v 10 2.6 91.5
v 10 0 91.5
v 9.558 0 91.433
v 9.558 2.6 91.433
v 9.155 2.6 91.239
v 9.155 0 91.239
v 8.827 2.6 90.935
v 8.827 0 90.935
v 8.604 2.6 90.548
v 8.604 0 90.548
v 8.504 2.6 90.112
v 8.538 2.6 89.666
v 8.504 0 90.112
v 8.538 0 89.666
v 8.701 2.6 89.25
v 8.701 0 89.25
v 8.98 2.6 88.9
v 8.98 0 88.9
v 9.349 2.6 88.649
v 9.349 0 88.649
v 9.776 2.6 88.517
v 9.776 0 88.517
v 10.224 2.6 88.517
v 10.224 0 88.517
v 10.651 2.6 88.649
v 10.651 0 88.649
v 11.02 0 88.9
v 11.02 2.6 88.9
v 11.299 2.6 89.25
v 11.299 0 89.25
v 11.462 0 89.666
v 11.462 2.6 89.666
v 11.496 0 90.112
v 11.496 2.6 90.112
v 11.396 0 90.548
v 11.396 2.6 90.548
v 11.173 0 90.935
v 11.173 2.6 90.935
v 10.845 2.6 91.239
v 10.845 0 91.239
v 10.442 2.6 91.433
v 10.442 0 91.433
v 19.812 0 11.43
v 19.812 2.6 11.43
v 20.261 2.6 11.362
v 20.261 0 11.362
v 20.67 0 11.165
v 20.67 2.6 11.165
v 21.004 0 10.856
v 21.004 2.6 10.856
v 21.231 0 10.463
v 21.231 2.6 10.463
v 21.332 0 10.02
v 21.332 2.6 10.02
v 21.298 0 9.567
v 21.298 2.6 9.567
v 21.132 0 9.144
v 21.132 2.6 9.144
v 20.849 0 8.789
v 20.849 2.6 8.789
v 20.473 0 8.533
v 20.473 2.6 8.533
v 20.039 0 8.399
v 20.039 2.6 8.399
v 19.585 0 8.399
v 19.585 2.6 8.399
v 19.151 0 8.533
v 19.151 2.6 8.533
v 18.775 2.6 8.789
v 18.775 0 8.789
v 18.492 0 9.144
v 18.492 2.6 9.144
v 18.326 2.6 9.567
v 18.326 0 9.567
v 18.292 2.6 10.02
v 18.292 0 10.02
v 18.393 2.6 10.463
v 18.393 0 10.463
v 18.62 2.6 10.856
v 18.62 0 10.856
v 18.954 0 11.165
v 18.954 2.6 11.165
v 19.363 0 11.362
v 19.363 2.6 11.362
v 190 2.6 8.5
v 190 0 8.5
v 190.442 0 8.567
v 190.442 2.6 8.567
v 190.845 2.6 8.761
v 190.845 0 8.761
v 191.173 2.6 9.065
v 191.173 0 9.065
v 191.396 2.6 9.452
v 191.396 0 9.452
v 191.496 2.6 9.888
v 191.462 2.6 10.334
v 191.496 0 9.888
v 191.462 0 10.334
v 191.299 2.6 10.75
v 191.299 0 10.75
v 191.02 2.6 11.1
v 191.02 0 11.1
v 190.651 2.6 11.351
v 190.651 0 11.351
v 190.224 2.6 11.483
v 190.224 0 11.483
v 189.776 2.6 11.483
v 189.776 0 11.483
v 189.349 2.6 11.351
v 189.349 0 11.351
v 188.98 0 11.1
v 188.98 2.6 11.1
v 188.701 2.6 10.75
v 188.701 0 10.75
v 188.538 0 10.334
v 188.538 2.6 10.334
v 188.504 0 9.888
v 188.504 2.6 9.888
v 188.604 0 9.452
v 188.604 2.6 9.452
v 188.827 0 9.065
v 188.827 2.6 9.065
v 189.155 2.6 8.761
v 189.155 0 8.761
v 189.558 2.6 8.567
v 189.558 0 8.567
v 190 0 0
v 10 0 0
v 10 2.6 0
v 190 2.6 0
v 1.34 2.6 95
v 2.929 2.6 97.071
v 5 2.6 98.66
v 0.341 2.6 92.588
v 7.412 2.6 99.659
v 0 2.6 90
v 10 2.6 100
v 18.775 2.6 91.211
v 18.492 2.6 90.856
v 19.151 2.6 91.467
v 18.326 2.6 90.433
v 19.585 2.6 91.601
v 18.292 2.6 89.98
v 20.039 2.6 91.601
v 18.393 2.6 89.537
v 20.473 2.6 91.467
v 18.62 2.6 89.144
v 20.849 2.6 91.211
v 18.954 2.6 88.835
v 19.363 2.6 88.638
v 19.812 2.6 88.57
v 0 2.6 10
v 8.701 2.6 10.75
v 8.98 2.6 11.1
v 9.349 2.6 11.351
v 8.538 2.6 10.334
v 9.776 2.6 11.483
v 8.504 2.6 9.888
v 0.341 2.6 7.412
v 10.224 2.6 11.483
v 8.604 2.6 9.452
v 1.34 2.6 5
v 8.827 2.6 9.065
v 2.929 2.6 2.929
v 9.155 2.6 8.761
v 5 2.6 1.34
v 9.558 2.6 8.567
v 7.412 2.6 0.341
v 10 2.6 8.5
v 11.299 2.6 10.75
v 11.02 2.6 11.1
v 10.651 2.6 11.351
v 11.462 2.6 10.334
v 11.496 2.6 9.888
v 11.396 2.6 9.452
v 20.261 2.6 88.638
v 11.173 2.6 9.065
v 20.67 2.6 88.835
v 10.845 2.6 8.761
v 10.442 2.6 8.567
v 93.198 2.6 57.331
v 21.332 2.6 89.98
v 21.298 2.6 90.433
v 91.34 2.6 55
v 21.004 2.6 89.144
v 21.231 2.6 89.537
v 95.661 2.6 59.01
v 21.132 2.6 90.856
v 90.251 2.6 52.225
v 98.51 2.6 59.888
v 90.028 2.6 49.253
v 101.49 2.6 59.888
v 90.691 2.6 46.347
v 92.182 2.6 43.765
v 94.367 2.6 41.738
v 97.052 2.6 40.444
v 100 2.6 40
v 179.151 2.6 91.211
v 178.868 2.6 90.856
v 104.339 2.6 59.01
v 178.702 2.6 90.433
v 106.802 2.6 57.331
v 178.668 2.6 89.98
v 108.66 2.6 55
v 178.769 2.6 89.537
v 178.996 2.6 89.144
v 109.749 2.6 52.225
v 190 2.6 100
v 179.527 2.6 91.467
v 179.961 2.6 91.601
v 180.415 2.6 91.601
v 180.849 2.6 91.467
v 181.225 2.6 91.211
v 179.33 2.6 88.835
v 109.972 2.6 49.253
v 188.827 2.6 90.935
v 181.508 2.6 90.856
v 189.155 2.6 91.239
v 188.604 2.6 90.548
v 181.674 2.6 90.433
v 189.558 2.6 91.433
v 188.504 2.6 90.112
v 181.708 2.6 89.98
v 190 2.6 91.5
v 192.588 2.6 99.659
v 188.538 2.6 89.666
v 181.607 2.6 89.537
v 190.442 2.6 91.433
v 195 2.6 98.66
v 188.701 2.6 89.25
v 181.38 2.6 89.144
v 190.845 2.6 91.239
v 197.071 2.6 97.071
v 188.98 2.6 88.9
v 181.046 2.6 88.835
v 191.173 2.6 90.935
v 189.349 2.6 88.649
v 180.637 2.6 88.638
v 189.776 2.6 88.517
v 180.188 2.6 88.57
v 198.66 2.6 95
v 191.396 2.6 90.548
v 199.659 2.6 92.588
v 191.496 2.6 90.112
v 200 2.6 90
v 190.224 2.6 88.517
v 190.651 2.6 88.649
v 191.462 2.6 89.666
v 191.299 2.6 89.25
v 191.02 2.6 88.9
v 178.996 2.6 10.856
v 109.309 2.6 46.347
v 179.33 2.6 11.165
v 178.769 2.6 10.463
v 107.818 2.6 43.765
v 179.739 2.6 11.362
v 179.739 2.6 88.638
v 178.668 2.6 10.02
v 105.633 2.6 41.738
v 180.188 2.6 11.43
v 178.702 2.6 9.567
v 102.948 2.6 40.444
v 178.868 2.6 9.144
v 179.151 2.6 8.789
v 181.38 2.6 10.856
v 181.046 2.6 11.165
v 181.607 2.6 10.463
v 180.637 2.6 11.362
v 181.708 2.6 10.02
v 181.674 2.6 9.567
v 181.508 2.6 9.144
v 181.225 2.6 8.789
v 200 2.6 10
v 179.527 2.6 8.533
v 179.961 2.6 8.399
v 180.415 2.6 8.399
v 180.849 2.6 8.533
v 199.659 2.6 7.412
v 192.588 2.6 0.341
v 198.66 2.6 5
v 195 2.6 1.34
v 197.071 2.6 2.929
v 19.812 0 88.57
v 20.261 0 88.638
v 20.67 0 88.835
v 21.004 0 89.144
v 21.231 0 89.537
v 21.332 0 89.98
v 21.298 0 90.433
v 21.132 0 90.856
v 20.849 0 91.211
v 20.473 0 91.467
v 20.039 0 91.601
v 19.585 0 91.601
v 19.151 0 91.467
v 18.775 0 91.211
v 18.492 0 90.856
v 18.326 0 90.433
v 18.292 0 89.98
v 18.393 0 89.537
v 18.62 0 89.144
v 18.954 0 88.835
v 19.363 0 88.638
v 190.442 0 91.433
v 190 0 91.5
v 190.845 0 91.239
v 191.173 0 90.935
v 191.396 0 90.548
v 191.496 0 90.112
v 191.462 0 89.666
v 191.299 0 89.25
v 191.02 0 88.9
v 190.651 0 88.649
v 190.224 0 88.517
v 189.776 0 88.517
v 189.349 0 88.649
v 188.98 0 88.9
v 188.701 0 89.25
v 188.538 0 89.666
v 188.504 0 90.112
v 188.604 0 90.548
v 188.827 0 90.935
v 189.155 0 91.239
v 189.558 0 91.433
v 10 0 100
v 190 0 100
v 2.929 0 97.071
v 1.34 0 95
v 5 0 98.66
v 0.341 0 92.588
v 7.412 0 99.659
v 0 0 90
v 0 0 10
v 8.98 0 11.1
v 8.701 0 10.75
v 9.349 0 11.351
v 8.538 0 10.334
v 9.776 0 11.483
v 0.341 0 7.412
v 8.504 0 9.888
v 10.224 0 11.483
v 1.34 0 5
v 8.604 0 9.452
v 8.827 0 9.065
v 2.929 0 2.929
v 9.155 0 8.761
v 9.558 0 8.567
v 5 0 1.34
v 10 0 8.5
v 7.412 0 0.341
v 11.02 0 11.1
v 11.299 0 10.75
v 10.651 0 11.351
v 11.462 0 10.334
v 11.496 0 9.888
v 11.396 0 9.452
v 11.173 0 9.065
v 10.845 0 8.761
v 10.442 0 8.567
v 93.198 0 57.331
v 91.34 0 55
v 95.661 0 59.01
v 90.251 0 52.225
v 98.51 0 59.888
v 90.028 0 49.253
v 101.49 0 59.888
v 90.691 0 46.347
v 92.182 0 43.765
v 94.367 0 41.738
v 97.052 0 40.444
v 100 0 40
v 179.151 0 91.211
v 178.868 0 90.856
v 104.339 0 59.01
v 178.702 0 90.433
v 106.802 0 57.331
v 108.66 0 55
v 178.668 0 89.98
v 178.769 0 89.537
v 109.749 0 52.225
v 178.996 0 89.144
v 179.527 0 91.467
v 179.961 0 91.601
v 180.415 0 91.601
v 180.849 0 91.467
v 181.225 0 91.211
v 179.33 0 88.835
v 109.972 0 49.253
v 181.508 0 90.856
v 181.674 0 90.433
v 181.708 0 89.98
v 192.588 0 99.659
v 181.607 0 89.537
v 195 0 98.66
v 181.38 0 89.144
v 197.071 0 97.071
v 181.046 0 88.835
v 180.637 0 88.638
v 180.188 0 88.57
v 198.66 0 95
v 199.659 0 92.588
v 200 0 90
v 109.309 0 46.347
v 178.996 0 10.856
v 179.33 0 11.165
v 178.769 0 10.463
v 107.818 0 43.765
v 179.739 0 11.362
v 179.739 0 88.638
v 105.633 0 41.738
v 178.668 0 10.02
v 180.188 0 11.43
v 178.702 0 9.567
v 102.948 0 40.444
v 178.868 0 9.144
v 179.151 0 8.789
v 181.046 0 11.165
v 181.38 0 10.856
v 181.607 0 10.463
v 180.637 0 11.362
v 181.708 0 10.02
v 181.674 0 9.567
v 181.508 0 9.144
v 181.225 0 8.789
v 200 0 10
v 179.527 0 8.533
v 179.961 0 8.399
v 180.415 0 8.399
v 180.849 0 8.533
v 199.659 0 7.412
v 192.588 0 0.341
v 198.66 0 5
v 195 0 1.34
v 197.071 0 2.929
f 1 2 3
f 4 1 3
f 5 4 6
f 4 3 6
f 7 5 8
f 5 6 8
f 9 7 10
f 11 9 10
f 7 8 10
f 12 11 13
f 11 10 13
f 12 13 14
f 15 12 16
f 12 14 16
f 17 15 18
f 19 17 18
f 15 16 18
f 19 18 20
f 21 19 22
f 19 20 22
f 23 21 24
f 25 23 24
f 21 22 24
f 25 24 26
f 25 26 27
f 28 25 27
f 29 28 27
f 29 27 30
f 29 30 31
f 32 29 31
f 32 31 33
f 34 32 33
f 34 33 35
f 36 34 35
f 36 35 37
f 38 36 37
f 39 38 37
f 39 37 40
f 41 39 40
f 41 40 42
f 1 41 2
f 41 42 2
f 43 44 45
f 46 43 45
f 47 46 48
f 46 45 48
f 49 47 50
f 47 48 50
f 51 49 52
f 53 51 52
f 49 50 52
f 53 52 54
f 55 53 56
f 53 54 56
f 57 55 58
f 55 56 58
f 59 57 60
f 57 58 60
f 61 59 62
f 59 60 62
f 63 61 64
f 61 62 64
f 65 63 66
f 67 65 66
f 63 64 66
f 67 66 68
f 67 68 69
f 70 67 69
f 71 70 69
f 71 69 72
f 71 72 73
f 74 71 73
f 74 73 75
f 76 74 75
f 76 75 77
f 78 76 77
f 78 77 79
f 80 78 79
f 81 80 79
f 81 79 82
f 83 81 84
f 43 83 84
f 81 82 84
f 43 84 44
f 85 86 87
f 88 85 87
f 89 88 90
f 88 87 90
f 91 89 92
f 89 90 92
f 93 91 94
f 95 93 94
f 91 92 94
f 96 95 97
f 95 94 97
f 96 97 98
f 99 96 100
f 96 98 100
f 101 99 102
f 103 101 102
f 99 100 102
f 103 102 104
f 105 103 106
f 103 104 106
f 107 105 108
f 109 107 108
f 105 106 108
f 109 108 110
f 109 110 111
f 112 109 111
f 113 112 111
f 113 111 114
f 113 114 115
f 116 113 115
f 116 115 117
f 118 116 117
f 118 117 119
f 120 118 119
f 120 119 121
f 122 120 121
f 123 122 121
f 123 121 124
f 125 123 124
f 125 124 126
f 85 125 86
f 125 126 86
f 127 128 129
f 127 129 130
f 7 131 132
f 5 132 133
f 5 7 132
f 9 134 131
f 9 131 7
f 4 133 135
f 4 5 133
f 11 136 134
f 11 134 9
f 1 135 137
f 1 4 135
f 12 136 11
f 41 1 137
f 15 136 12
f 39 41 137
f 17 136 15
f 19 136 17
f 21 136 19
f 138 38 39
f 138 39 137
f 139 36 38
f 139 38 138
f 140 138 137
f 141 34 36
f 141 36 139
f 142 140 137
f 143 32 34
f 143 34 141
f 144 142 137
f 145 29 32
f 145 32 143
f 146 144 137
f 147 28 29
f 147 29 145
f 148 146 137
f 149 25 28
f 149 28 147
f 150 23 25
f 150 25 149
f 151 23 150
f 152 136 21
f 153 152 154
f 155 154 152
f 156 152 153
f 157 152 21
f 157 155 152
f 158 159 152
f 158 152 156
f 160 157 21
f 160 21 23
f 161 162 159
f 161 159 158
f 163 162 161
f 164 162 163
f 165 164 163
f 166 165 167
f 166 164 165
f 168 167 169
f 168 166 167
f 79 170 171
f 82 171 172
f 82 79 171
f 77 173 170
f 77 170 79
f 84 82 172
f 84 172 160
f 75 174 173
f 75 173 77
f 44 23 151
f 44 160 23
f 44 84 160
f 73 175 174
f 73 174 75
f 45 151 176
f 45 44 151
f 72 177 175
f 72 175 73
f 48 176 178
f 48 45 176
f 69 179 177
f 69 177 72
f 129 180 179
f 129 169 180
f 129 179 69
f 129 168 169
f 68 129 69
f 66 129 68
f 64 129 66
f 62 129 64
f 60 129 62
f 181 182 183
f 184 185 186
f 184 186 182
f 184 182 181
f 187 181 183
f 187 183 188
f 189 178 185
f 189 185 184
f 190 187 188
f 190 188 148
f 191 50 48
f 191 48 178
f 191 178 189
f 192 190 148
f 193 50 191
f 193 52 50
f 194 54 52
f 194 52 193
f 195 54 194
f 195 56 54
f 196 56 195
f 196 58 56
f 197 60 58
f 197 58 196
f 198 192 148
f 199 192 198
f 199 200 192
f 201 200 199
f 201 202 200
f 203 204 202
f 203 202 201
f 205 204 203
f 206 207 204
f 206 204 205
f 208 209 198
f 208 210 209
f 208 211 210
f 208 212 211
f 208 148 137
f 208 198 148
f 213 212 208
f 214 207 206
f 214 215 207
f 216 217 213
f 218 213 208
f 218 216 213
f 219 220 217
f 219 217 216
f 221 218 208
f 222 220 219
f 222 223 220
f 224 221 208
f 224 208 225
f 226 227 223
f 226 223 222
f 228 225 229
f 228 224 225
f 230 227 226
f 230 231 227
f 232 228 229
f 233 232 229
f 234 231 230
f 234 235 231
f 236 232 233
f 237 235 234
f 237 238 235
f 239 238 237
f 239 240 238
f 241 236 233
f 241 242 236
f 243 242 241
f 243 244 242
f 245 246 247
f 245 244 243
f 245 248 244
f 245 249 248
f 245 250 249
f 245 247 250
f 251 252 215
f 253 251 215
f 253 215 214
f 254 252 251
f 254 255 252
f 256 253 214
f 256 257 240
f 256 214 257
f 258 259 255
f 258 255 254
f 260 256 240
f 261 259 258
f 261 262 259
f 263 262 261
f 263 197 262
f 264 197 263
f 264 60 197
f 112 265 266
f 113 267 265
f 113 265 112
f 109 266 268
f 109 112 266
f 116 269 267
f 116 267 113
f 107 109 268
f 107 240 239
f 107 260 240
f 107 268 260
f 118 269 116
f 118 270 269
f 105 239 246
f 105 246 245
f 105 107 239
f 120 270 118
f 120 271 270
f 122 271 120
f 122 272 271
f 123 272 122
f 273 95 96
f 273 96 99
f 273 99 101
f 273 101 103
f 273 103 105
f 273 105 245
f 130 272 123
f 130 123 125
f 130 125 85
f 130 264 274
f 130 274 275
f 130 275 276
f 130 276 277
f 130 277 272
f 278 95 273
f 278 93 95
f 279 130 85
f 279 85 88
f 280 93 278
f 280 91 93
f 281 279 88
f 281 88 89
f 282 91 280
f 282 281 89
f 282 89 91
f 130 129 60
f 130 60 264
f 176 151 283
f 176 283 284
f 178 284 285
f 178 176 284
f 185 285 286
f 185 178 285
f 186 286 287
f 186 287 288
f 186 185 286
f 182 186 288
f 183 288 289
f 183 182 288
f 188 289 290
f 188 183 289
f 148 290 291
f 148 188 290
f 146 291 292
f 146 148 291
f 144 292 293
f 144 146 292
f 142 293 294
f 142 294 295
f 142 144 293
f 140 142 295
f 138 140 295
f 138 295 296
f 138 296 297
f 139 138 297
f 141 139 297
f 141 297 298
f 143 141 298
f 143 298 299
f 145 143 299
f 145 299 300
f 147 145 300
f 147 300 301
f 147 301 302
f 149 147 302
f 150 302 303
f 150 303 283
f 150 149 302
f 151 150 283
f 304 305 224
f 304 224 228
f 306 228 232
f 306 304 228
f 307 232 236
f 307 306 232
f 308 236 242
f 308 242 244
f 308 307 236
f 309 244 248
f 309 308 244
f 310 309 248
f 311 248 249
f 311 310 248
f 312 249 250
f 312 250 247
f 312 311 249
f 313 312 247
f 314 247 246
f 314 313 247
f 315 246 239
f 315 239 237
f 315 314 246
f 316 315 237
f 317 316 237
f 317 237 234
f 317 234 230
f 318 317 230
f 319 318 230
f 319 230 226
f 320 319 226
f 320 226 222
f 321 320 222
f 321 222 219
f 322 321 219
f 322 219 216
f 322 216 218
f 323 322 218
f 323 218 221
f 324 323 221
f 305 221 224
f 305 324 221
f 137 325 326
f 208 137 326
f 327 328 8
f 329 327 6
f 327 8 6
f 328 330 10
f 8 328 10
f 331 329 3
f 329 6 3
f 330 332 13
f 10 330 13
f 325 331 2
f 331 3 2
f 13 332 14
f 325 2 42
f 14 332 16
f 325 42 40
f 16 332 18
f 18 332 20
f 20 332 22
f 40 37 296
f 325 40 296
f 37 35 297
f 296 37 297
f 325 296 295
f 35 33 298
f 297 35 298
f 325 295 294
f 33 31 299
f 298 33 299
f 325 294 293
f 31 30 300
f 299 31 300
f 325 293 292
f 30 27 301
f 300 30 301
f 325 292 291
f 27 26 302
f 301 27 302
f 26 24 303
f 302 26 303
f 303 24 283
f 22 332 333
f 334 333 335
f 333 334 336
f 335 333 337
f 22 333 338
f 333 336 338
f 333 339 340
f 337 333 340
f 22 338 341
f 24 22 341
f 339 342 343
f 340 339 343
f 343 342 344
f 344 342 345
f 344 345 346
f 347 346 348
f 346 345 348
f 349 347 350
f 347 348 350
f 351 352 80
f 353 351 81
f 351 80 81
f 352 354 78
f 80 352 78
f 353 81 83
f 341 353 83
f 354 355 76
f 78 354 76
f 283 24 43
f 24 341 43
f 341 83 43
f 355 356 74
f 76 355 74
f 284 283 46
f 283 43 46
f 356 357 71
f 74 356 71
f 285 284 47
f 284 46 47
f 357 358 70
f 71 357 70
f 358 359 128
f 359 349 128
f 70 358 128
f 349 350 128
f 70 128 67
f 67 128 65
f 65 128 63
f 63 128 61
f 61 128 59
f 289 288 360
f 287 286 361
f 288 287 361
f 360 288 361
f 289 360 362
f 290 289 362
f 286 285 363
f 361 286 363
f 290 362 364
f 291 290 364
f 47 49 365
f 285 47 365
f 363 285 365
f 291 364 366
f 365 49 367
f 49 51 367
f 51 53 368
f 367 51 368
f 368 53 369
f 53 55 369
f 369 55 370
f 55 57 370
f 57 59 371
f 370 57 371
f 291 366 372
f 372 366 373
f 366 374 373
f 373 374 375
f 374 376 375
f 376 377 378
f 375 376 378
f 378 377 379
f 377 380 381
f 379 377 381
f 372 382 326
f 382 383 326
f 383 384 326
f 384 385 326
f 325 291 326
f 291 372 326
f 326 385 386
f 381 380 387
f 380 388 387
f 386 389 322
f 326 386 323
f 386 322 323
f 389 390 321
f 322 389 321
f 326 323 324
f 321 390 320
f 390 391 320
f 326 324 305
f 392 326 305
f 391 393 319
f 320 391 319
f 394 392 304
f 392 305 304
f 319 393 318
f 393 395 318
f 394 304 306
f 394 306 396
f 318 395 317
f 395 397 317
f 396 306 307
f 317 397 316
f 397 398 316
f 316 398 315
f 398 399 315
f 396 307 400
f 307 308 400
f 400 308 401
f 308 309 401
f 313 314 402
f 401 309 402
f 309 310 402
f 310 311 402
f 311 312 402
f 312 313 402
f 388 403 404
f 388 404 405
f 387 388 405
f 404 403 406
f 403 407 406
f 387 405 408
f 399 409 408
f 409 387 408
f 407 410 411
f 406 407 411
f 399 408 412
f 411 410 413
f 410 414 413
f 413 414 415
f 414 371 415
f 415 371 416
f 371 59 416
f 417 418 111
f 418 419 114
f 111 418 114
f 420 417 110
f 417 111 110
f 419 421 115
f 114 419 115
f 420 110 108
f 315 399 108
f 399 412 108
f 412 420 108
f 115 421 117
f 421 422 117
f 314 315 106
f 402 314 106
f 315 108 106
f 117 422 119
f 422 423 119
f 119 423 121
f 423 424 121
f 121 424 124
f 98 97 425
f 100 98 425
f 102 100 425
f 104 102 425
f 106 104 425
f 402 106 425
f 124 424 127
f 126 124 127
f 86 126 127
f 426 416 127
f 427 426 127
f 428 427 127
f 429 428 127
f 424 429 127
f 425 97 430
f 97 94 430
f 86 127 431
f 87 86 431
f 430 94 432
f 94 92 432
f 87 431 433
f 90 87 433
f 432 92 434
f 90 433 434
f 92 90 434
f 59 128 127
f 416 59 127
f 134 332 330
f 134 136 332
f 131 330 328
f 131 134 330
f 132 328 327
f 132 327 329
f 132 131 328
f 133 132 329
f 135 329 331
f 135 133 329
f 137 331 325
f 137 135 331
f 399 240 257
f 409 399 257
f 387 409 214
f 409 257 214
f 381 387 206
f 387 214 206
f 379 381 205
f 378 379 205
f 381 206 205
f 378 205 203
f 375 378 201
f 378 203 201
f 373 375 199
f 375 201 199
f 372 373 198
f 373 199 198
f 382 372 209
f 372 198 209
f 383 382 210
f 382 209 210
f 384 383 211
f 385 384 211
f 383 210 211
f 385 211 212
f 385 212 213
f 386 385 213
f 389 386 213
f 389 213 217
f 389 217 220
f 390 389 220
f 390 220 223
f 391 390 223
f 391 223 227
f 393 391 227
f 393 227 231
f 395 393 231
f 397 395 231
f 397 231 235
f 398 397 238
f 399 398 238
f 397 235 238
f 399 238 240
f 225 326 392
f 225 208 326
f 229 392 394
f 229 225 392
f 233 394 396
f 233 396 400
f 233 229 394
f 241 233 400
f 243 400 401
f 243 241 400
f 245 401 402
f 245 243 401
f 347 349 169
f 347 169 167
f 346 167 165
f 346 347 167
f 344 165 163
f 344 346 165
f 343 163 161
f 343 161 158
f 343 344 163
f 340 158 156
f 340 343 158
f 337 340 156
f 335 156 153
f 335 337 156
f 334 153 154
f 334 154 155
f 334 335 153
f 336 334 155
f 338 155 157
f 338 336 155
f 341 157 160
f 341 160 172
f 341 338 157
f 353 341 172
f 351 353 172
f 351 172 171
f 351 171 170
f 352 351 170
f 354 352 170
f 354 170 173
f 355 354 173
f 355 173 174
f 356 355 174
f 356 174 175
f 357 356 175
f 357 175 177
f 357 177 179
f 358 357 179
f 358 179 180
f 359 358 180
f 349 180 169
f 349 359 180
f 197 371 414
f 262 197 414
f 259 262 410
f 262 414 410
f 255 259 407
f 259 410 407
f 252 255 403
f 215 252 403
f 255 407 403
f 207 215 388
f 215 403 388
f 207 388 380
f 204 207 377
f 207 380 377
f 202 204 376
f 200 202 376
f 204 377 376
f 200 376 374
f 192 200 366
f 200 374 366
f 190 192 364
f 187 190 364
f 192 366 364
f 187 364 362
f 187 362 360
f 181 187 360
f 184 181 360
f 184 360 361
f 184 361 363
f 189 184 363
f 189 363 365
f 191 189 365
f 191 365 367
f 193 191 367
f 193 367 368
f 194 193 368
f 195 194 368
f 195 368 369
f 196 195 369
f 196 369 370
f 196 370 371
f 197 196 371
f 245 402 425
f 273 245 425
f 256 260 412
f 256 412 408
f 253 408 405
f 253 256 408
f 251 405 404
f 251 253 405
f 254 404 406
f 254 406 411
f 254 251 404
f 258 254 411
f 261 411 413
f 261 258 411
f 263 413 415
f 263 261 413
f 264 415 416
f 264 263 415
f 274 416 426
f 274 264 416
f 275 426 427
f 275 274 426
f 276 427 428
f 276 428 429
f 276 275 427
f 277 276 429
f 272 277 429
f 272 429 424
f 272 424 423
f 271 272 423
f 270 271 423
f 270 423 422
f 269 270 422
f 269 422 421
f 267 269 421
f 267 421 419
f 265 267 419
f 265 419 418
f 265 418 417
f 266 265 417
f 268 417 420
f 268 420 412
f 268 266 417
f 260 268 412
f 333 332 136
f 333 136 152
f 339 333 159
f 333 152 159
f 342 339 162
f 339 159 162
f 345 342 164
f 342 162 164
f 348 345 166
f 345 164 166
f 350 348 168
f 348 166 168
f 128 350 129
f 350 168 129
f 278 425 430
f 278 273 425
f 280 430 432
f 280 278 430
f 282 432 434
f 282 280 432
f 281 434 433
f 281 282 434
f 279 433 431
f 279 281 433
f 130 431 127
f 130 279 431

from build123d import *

# Parameters (mm, degrees)
SKETCH1_W               = 200
SKETCH1_H               = 100
BOSS_EXTRUDE1_DEPTH     = 2.6
FILLET1_R               = 10
SKETCH6_R               = 1.5
CUT_EXTRUDE6_DEPTH      = 2.6
MIRROR6_COPY_1_SKETCH_R = 1.5
MIRROR6_COPY_1_DEPTH    = 2.6
SKETCH15_R              = 10
CUT_EXTRUDE14_DEPTH     = 224.621913059
SKETCH23_R              = 1.524
CUT_EXTRUDE16_DEPTH     = 2.59999988
MIRROR8_COPY_1_SKETCH_R = 1.524
MIRROR8_COPY_1_DEPTH    = 2.59999988


with BuildPart() as part:
    # Sketch1 → Boss-Extrude1 (new body)
    with BuildSketch(Plane(origin=(0, 0, 0), x_dir=(1, 0, 0), z_dir=(0, 1, 0))):
        with Locations((100, -50)):
            Rectangle(SKETCH1_W, SKETCH1_H)
    extrude(amount=BOSS_EXTRUDE1_DEPTH)

    # Fillet1
    fillet1_edges = [part.edges().sort_by_distance(p)[0] for p in [
        (0, 1.3, 0),
        (200, 1.3, 0),
        (200, 1.3, 100),
        (0, 1.3, 100),
    ]]
    fillet(fillet1_edges, radius=FILLET1_R)

    # Sketch6 → Cut-Extrude6 (cut)
    with BuildSketch(Plane.XZ):
        with Locations(Location((190, 10, 0), (0, 0, 270))):
            Circle(SKETCH6_R)
    cut_extrude6 = extrude(amount=-CUT_EXTRUDE6_DEPTH, mode=Mode.SUBTRACT)

    # Mirror5: Cut-Extrude6 across plane
    add(cut_extrude6.mirror(Plane(origin=(100, 0, 0), x_dir=(0, 0, 1), z_dir=(1, 0, 0))), mode=Mode.SUBTRACT)

    # Mirror6: Cut-Extrude6 across plane
    add(cut_extrude6.mirror(Plane.XY.offset(50)), mode=Mode.SUBTRACT)

    # Mirror6 copy 1 sketch → Mirror6 copy 1 (cut)
    with BuildSketch(Plane(origin=(200, 0, 100), x_dir=(-1, 0, 0), z_dir=(0, -1, 0))):
        with Locations(Location((190, 10, 0), (0, 0, 270))):
            Circle(MIRROR6_COPY_1_SKETCH_R)
    extrude(amount=-MIRROR6_COPY_1_DEPTH, mode=Mode.SUBTRACT)

    # Sketch15 → Cut-Extrude14 (cut, through all)
    with BuildSketch(Plane.XZ):
        with Locations(Location((100, 50, 0), (0, 0, 270))):
            Circle(SKETCH15_R)
    extrude(amount=-CUT_EXTRUDE14_DEPTH, mode=Mode.SUBTRACT)

    # Sketch23 → Cut-Extrude16 (cut)
    with BuildSketch(Plane(origin=(0, 2.6, 0), x_dir=(1, 0, 0), z_dir=(0, 1, 0))):
        with Locations(Location((19.812, -9.906, 0), (0, 0, 270))):
            Circle(SKETCH23_R)
    cut_extrude16 = extrude(amount=-CUT_EXTRUDE16_DEPTH, mode=Mode.SUBTRACT)

    # Mirror7: Cut-Extrude16 across plane
    add(cut_extrude16.mirror(Plane(origin=(100, 0, 0), x_dir=(0, 0, 1), z_dir=(1, 0, 0))), mode=Mode.SUBTRACT)

    # Mirror8: Cut-Extrude16 across plane
    add(cut_extrude16.mirror(Plane.XY.offset(50)), mode=Mode.SUBTRACT)

    # Mirror8 copy 1 sketch → Mirror8 copy 1 (cut)
    with BuildSketch(Plane(origin=(200, 2.6, 100), x_dir=(-1, 0, 0), z_dir=(0, 1, 0))):
        with Locations(Location((19.812, -9.906, 0), (0, 0, 270))):
            Circle(MIRROR8_COPY_1_SKETCH_R)
    extrude(amount=-MIRROR8_COPY_1_DEPTH, mode=Mode.SUBTRACT)


solid = part.part
